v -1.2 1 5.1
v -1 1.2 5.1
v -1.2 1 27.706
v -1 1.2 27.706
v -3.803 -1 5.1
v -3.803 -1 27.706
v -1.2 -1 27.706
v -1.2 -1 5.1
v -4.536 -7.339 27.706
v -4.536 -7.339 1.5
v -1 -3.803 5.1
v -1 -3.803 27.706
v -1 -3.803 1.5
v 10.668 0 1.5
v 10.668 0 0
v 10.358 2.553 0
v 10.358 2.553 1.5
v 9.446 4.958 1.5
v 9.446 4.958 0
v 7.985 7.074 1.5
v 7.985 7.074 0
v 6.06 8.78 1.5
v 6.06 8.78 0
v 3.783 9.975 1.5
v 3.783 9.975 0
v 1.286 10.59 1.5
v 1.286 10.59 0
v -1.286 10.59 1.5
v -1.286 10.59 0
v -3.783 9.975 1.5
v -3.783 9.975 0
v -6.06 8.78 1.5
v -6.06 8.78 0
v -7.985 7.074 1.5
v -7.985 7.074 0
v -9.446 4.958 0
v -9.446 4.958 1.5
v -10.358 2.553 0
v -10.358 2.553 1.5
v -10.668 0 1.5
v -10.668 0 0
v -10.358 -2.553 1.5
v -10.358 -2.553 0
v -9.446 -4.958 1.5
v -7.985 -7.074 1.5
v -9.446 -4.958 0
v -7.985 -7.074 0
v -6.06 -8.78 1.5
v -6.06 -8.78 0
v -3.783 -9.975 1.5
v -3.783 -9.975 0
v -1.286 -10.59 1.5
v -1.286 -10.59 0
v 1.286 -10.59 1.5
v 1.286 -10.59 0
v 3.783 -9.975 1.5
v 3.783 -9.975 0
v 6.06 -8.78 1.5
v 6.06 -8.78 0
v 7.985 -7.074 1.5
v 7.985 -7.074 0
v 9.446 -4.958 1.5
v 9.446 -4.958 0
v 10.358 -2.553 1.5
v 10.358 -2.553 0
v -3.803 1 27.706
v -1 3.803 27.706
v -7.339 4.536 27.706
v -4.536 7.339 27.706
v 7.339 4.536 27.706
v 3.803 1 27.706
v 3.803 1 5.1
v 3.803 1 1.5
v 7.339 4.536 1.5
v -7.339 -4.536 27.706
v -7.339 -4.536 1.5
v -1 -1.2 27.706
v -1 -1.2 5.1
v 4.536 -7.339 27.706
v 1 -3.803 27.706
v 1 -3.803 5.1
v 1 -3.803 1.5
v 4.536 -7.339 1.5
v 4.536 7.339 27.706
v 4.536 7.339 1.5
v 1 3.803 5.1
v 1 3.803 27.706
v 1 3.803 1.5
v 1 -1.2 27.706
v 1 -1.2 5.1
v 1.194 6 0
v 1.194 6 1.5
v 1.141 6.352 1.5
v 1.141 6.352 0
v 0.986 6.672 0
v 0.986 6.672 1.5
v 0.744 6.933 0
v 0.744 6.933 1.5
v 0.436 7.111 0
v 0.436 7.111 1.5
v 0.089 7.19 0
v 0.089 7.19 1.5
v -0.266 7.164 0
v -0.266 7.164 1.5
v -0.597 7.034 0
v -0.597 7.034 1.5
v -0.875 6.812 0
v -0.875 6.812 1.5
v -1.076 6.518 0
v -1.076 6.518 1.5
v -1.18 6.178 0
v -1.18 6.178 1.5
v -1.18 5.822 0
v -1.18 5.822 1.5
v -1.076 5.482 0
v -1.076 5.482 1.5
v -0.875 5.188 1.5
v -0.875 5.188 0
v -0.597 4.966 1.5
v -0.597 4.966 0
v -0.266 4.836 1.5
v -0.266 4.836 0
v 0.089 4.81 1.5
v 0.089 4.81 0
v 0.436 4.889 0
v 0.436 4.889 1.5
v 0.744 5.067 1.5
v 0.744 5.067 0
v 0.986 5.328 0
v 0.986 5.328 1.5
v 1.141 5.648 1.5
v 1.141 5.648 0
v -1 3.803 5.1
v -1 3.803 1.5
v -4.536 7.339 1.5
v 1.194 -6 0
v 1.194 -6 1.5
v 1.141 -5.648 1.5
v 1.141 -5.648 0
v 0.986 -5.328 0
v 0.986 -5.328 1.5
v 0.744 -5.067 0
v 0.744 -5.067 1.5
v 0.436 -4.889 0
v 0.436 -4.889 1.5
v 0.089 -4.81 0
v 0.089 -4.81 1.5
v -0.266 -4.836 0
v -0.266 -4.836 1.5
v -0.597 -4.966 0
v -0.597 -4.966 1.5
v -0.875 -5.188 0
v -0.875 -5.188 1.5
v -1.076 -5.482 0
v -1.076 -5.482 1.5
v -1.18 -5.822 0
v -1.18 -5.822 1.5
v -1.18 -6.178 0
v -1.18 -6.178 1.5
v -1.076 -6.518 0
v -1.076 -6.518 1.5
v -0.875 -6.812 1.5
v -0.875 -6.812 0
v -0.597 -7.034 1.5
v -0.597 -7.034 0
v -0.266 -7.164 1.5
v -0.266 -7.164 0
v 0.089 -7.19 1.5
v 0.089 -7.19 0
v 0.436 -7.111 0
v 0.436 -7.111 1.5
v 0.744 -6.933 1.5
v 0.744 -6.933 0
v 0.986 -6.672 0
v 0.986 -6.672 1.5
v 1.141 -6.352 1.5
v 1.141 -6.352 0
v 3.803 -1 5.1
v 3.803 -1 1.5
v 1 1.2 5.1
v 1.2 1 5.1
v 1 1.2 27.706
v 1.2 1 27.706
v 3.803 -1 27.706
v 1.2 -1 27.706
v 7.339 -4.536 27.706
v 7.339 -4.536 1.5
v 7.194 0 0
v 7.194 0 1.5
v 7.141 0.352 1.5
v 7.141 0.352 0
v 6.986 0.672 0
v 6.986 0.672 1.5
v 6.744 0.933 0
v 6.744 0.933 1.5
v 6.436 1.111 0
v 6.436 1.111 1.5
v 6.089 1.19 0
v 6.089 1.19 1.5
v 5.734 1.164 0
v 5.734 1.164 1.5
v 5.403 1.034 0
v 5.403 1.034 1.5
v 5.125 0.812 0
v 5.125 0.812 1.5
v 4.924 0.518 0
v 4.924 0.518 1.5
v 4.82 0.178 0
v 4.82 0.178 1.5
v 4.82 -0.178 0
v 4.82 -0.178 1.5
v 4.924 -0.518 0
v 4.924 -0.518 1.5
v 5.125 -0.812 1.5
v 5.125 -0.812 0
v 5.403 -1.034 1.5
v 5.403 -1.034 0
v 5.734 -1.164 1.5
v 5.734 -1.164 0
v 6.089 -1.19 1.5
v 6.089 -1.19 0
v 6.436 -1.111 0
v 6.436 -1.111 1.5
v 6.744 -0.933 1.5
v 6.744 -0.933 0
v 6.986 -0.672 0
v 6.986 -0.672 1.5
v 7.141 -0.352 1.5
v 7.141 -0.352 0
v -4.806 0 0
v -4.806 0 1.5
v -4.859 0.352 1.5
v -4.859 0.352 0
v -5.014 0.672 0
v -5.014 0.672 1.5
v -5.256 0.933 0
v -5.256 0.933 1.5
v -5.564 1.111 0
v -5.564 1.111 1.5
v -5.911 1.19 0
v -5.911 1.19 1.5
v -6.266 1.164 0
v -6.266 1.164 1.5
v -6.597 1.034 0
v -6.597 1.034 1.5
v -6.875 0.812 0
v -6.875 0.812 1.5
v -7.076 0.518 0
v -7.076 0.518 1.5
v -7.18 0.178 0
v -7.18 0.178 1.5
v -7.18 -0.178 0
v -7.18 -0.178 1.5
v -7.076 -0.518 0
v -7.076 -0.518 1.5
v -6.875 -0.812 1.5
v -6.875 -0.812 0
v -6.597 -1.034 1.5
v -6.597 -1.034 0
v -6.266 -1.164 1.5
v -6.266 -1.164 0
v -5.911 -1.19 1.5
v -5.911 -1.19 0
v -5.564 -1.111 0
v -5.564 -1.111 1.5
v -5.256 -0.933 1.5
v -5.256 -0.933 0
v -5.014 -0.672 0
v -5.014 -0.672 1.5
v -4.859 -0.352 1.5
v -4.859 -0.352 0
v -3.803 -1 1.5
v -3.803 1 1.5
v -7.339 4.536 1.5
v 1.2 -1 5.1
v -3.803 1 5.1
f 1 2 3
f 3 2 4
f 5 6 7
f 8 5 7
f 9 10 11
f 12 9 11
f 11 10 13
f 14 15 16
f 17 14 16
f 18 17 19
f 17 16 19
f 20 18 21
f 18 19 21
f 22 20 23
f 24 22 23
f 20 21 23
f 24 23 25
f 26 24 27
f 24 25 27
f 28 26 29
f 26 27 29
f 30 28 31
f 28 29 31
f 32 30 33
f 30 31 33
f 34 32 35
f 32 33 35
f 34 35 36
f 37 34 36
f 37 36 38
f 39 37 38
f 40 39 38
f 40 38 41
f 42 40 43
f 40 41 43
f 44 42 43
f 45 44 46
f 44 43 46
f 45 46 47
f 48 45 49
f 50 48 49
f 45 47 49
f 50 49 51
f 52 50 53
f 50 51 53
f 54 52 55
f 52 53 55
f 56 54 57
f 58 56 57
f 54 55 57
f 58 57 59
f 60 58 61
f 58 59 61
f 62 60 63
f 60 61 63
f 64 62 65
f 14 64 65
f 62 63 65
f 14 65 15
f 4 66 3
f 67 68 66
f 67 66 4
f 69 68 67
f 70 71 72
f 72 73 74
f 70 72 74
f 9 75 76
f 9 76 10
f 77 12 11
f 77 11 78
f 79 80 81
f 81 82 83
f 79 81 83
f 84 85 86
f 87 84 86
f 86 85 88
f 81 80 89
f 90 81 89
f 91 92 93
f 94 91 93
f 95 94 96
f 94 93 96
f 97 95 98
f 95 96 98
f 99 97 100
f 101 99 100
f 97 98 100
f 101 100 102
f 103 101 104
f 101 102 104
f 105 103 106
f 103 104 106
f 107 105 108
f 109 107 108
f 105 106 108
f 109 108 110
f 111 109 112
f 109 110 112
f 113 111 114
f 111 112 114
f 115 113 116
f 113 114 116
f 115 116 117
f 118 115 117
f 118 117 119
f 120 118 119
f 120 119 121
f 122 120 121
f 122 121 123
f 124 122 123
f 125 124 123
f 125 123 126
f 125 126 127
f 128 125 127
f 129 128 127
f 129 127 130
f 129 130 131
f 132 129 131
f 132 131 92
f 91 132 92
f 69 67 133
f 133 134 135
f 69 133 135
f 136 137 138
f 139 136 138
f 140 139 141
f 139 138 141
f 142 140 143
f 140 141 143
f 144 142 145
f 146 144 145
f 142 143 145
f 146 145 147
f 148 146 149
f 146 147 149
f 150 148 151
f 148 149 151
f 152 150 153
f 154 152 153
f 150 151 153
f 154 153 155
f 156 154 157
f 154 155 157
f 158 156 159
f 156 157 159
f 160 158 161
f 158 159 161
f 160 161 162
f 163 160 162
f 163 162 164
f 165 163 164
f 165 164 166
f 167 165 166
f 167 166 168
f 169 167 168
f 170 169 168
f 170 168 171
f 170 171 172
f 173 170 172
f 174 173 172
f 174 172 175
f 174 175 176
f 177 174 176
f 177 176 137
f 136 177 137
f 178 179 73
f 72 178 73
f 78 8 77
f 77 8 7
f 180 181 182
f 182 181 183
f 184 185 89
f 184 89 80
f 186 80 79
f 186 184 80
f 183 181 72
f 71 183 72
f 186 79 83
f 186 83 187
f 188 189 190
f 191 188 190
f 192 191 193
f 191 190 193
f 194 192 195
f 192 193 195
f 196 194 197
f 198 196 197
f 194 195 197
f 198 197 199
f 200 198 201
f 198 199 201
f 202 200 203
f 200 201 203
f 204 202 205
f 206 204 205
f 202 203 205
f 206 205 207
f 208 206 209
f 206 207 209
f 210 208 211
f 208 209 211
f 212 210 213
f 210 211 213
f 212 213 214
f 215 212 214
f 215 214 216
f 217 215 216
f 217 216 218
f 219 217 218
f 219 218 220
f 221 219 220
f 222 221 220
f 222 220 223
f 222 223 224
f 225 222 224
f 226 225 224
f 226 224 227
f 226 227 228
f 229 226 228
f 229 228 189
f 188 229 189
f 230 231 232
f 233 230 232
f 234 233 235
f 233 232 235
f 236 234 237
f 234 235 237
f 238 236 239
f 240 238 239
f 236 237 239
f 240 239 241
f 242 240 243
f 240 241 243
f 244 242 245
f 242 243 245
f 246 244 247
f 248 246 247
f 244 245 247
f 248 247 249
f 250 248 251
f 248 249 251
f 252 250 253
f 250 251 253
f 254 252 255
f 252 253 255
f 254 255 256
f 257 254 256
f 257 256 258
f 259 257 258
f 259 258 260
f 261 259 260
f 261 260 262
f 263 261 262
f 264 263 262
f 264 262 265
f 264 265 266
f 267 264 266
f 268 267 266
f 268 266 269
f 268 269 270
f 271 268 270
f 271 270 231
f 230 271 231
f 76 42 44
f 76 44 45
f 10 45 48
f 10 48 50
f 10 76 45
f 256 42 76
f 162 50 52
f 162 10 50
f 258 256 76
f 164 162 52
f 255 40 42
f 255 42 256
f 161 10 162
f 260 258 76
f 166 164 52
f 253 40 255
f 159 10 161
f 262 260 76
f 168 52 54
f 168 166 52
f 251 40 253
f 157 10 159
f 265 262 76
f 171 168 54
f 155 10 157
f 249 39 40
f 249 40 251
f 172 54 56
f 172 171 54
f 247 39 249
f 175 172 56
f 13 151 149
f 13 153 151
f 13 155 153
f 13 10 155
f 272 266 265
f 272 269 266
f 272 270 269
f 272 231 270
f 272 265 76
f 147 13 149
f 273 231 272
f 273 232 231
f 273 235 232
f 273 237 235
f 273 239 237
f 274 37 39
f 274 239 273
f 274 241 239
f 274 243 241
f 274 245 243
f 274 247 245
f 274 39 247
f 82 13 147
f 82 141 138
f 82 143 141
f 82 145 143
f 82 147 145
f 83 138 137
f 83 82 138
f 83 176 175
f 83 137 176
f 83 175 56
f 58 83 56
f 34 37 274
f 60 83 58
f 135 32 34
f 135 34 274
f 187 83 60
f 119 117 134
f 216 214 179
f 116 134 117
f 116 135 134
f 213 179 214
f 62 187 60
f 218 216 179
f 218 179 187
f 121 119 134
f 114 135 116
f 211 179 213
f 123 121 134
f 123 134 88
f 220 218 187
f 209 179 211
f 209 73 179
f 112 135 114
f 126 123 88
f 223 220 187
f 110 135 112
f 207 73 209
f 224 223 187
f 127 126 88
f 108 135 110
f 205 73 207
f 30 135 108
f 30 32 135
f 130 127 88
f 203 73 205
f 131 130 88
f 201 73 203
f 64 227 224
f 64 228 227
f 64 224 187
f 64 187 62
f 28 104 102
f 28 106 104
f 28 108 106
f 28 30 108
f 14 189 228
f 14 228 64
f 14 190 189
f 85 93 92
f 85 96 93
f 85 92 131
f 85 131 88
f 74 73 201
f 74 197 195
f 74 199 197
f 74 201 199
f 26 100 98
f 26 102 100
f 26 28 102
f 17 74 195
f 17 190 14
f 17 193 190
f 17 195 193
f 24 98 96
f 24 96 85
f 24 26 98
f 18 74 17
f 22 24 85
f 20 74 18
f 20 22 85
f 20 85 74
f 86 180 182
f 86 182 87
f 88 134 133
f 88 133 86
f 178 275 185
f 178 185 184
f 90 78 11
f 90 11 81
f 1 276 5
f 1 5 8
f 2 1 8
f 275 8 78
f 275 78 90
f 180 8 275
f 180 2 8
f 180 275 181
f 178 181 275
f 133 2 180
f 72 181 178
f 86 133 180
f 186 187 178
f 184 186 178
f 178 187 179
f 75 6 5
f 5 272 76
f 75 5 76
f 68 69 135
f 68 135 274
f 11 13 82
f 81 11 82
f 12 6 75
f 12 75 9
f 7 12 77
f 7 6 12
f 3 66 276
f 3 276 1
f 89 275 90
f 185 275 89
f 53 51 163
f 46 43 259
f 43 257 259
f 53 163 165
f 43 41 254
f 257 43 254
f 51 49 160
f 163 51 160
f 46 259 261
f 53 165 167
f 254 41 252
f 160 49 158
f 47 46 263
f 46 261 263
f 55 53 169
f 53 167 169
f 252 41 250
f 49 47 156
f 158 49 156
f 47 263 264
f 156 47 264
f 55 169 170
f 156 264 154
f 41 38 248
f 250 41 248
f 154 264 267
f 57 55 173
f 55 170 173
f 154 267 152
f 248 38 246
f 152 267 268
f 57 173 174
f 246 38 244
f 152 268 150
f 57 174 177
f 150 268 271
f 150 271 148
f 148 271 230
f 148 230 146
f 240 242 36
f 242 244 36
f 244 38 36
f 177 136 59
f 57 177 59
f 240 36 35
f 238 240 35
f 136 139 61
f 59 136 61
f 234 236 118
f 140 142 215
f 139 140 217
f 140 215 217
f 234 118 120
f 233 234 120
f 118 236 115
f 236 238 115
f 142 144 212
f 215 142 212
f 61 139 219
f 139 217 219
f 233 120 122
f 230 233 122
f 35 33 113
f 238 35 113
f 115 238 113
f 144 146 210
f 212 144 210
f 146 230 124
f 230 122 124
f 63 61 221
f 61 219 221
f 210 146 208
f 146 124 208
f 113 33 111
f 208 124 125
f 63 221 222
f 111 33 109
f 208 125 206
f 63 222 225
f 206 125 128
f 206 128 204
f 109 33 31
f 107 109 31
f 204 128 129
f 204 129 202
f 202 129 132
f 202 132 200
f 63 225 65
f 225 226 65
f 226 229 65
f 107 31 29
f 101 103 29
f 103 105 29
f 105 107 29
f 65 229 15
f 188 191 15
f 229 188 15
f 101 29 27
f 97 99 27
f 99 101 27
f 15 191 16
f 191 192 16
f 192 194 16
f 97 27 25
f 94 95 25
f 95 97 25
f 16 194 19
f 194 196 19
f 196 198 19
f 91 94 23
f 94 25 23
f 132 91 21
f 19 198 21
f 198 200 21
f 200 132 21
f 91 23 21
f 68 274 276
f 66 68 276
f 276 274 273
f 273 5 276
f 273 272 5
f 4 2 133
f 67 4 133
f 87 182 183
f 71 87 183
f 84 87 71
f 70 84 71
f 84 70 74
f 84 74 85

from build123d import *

# Parameters (mm, degrees)
F0_R     = 10.66798
F1_DEPTH = 1.5
F2_R     = 1.19378
F3_DEPTH = 1.501
F4_W     = 7.606
F4_H     = 7.606
F5_DEPTH = 3.6
F6_W     = 2.803
F6_H     = 2.803
F7_DEPTH = 22.606
F9_DEPTH = 26.206
F10_SIZE = 0.2


with BuildPart() as f1:
    # F0 (on Top) → F1 (new body)
    with BuildSketch(Plane.XY):
        Circle(F0_R)
    extrude(amount=F1_DEPTH)

    # F2 (on face) → F3 (cut, through all)
    with BuildSketch(Plane.XY.offset(1.5)):
        with Locations((-6, 0)):
            Circle(F2_R)
        with Locations((0, 6)):
            Circle(F2_R)
        with Locations((6, 0)):
            Circle(F2_R)
        with Locations((0, -6)):
            Circle(F2_R)
    extrude(amount=-F3_DEPTH, mode=Mode.SUBTRACT)

    # F4 (on face) → F5 (join)
    with BuildSketch(Plane.XY.offset(1.5)):
        Rectangle(F4_W, F4_H)
    extrude(amount=F5_DEPTH)

    # F6 (on face) → F7 (join)
    with BuildSketch(Plane.XY.offset(5.1)):
        with Locations((-2.4015, 2.4015)):
            Rectangle(F6_W, F6_H)
        with Locations((-2.4015, -2.4015)):
            Rectangle(F6_W, F6_H)
        with Locations((2.4015, -2.4015)):
            Rectangle(F6_W, F6_H)
        with Locations((2.4015, 2.4015)):
            Rectangle(F6_W, F6_H)
    extrude(amount=F7_DEPTH)

    # F8 (on face) → F9 (join, through all)
    with BuildSketch(Plane.XY.offset(1.5)):
        Polygon((3.803, -3.803), (1, -3.803), (4.535534, -7.338534), (7.338534, -4.535534), (3.803, -1), align=None)
        Polygon((7.338534, 4.535534), (4.535534, 7.338534), (1, 3.803), (3.803, 3.803), (3.803, 1), align=None)
        Polygon((-4.535534, 7.338534), (-7.338534, 4.535534), (-3.803, 1), (-3.803, 3.803), (-1, 3.803), align=None)
        Polygon((-7.338534, -4.535534), (-4.535534, -7.338534), (-1, -3.803), (-3.803, -3.803), (-3.803, -1), align=None)
    extrude(amount=F9_DEPTH)

    # F10
    f10_edges = [f1.edges().sort_by_distance(p)[0] for p in [
        (-1, 1, 16.403),
        (1, 1, 16.403),
        (1, -1, 16.403),
        (-1, -1, 16.403),
    ]]
    chamfer(f10_edges, length=F10_SIZE)


solid = f1.part
